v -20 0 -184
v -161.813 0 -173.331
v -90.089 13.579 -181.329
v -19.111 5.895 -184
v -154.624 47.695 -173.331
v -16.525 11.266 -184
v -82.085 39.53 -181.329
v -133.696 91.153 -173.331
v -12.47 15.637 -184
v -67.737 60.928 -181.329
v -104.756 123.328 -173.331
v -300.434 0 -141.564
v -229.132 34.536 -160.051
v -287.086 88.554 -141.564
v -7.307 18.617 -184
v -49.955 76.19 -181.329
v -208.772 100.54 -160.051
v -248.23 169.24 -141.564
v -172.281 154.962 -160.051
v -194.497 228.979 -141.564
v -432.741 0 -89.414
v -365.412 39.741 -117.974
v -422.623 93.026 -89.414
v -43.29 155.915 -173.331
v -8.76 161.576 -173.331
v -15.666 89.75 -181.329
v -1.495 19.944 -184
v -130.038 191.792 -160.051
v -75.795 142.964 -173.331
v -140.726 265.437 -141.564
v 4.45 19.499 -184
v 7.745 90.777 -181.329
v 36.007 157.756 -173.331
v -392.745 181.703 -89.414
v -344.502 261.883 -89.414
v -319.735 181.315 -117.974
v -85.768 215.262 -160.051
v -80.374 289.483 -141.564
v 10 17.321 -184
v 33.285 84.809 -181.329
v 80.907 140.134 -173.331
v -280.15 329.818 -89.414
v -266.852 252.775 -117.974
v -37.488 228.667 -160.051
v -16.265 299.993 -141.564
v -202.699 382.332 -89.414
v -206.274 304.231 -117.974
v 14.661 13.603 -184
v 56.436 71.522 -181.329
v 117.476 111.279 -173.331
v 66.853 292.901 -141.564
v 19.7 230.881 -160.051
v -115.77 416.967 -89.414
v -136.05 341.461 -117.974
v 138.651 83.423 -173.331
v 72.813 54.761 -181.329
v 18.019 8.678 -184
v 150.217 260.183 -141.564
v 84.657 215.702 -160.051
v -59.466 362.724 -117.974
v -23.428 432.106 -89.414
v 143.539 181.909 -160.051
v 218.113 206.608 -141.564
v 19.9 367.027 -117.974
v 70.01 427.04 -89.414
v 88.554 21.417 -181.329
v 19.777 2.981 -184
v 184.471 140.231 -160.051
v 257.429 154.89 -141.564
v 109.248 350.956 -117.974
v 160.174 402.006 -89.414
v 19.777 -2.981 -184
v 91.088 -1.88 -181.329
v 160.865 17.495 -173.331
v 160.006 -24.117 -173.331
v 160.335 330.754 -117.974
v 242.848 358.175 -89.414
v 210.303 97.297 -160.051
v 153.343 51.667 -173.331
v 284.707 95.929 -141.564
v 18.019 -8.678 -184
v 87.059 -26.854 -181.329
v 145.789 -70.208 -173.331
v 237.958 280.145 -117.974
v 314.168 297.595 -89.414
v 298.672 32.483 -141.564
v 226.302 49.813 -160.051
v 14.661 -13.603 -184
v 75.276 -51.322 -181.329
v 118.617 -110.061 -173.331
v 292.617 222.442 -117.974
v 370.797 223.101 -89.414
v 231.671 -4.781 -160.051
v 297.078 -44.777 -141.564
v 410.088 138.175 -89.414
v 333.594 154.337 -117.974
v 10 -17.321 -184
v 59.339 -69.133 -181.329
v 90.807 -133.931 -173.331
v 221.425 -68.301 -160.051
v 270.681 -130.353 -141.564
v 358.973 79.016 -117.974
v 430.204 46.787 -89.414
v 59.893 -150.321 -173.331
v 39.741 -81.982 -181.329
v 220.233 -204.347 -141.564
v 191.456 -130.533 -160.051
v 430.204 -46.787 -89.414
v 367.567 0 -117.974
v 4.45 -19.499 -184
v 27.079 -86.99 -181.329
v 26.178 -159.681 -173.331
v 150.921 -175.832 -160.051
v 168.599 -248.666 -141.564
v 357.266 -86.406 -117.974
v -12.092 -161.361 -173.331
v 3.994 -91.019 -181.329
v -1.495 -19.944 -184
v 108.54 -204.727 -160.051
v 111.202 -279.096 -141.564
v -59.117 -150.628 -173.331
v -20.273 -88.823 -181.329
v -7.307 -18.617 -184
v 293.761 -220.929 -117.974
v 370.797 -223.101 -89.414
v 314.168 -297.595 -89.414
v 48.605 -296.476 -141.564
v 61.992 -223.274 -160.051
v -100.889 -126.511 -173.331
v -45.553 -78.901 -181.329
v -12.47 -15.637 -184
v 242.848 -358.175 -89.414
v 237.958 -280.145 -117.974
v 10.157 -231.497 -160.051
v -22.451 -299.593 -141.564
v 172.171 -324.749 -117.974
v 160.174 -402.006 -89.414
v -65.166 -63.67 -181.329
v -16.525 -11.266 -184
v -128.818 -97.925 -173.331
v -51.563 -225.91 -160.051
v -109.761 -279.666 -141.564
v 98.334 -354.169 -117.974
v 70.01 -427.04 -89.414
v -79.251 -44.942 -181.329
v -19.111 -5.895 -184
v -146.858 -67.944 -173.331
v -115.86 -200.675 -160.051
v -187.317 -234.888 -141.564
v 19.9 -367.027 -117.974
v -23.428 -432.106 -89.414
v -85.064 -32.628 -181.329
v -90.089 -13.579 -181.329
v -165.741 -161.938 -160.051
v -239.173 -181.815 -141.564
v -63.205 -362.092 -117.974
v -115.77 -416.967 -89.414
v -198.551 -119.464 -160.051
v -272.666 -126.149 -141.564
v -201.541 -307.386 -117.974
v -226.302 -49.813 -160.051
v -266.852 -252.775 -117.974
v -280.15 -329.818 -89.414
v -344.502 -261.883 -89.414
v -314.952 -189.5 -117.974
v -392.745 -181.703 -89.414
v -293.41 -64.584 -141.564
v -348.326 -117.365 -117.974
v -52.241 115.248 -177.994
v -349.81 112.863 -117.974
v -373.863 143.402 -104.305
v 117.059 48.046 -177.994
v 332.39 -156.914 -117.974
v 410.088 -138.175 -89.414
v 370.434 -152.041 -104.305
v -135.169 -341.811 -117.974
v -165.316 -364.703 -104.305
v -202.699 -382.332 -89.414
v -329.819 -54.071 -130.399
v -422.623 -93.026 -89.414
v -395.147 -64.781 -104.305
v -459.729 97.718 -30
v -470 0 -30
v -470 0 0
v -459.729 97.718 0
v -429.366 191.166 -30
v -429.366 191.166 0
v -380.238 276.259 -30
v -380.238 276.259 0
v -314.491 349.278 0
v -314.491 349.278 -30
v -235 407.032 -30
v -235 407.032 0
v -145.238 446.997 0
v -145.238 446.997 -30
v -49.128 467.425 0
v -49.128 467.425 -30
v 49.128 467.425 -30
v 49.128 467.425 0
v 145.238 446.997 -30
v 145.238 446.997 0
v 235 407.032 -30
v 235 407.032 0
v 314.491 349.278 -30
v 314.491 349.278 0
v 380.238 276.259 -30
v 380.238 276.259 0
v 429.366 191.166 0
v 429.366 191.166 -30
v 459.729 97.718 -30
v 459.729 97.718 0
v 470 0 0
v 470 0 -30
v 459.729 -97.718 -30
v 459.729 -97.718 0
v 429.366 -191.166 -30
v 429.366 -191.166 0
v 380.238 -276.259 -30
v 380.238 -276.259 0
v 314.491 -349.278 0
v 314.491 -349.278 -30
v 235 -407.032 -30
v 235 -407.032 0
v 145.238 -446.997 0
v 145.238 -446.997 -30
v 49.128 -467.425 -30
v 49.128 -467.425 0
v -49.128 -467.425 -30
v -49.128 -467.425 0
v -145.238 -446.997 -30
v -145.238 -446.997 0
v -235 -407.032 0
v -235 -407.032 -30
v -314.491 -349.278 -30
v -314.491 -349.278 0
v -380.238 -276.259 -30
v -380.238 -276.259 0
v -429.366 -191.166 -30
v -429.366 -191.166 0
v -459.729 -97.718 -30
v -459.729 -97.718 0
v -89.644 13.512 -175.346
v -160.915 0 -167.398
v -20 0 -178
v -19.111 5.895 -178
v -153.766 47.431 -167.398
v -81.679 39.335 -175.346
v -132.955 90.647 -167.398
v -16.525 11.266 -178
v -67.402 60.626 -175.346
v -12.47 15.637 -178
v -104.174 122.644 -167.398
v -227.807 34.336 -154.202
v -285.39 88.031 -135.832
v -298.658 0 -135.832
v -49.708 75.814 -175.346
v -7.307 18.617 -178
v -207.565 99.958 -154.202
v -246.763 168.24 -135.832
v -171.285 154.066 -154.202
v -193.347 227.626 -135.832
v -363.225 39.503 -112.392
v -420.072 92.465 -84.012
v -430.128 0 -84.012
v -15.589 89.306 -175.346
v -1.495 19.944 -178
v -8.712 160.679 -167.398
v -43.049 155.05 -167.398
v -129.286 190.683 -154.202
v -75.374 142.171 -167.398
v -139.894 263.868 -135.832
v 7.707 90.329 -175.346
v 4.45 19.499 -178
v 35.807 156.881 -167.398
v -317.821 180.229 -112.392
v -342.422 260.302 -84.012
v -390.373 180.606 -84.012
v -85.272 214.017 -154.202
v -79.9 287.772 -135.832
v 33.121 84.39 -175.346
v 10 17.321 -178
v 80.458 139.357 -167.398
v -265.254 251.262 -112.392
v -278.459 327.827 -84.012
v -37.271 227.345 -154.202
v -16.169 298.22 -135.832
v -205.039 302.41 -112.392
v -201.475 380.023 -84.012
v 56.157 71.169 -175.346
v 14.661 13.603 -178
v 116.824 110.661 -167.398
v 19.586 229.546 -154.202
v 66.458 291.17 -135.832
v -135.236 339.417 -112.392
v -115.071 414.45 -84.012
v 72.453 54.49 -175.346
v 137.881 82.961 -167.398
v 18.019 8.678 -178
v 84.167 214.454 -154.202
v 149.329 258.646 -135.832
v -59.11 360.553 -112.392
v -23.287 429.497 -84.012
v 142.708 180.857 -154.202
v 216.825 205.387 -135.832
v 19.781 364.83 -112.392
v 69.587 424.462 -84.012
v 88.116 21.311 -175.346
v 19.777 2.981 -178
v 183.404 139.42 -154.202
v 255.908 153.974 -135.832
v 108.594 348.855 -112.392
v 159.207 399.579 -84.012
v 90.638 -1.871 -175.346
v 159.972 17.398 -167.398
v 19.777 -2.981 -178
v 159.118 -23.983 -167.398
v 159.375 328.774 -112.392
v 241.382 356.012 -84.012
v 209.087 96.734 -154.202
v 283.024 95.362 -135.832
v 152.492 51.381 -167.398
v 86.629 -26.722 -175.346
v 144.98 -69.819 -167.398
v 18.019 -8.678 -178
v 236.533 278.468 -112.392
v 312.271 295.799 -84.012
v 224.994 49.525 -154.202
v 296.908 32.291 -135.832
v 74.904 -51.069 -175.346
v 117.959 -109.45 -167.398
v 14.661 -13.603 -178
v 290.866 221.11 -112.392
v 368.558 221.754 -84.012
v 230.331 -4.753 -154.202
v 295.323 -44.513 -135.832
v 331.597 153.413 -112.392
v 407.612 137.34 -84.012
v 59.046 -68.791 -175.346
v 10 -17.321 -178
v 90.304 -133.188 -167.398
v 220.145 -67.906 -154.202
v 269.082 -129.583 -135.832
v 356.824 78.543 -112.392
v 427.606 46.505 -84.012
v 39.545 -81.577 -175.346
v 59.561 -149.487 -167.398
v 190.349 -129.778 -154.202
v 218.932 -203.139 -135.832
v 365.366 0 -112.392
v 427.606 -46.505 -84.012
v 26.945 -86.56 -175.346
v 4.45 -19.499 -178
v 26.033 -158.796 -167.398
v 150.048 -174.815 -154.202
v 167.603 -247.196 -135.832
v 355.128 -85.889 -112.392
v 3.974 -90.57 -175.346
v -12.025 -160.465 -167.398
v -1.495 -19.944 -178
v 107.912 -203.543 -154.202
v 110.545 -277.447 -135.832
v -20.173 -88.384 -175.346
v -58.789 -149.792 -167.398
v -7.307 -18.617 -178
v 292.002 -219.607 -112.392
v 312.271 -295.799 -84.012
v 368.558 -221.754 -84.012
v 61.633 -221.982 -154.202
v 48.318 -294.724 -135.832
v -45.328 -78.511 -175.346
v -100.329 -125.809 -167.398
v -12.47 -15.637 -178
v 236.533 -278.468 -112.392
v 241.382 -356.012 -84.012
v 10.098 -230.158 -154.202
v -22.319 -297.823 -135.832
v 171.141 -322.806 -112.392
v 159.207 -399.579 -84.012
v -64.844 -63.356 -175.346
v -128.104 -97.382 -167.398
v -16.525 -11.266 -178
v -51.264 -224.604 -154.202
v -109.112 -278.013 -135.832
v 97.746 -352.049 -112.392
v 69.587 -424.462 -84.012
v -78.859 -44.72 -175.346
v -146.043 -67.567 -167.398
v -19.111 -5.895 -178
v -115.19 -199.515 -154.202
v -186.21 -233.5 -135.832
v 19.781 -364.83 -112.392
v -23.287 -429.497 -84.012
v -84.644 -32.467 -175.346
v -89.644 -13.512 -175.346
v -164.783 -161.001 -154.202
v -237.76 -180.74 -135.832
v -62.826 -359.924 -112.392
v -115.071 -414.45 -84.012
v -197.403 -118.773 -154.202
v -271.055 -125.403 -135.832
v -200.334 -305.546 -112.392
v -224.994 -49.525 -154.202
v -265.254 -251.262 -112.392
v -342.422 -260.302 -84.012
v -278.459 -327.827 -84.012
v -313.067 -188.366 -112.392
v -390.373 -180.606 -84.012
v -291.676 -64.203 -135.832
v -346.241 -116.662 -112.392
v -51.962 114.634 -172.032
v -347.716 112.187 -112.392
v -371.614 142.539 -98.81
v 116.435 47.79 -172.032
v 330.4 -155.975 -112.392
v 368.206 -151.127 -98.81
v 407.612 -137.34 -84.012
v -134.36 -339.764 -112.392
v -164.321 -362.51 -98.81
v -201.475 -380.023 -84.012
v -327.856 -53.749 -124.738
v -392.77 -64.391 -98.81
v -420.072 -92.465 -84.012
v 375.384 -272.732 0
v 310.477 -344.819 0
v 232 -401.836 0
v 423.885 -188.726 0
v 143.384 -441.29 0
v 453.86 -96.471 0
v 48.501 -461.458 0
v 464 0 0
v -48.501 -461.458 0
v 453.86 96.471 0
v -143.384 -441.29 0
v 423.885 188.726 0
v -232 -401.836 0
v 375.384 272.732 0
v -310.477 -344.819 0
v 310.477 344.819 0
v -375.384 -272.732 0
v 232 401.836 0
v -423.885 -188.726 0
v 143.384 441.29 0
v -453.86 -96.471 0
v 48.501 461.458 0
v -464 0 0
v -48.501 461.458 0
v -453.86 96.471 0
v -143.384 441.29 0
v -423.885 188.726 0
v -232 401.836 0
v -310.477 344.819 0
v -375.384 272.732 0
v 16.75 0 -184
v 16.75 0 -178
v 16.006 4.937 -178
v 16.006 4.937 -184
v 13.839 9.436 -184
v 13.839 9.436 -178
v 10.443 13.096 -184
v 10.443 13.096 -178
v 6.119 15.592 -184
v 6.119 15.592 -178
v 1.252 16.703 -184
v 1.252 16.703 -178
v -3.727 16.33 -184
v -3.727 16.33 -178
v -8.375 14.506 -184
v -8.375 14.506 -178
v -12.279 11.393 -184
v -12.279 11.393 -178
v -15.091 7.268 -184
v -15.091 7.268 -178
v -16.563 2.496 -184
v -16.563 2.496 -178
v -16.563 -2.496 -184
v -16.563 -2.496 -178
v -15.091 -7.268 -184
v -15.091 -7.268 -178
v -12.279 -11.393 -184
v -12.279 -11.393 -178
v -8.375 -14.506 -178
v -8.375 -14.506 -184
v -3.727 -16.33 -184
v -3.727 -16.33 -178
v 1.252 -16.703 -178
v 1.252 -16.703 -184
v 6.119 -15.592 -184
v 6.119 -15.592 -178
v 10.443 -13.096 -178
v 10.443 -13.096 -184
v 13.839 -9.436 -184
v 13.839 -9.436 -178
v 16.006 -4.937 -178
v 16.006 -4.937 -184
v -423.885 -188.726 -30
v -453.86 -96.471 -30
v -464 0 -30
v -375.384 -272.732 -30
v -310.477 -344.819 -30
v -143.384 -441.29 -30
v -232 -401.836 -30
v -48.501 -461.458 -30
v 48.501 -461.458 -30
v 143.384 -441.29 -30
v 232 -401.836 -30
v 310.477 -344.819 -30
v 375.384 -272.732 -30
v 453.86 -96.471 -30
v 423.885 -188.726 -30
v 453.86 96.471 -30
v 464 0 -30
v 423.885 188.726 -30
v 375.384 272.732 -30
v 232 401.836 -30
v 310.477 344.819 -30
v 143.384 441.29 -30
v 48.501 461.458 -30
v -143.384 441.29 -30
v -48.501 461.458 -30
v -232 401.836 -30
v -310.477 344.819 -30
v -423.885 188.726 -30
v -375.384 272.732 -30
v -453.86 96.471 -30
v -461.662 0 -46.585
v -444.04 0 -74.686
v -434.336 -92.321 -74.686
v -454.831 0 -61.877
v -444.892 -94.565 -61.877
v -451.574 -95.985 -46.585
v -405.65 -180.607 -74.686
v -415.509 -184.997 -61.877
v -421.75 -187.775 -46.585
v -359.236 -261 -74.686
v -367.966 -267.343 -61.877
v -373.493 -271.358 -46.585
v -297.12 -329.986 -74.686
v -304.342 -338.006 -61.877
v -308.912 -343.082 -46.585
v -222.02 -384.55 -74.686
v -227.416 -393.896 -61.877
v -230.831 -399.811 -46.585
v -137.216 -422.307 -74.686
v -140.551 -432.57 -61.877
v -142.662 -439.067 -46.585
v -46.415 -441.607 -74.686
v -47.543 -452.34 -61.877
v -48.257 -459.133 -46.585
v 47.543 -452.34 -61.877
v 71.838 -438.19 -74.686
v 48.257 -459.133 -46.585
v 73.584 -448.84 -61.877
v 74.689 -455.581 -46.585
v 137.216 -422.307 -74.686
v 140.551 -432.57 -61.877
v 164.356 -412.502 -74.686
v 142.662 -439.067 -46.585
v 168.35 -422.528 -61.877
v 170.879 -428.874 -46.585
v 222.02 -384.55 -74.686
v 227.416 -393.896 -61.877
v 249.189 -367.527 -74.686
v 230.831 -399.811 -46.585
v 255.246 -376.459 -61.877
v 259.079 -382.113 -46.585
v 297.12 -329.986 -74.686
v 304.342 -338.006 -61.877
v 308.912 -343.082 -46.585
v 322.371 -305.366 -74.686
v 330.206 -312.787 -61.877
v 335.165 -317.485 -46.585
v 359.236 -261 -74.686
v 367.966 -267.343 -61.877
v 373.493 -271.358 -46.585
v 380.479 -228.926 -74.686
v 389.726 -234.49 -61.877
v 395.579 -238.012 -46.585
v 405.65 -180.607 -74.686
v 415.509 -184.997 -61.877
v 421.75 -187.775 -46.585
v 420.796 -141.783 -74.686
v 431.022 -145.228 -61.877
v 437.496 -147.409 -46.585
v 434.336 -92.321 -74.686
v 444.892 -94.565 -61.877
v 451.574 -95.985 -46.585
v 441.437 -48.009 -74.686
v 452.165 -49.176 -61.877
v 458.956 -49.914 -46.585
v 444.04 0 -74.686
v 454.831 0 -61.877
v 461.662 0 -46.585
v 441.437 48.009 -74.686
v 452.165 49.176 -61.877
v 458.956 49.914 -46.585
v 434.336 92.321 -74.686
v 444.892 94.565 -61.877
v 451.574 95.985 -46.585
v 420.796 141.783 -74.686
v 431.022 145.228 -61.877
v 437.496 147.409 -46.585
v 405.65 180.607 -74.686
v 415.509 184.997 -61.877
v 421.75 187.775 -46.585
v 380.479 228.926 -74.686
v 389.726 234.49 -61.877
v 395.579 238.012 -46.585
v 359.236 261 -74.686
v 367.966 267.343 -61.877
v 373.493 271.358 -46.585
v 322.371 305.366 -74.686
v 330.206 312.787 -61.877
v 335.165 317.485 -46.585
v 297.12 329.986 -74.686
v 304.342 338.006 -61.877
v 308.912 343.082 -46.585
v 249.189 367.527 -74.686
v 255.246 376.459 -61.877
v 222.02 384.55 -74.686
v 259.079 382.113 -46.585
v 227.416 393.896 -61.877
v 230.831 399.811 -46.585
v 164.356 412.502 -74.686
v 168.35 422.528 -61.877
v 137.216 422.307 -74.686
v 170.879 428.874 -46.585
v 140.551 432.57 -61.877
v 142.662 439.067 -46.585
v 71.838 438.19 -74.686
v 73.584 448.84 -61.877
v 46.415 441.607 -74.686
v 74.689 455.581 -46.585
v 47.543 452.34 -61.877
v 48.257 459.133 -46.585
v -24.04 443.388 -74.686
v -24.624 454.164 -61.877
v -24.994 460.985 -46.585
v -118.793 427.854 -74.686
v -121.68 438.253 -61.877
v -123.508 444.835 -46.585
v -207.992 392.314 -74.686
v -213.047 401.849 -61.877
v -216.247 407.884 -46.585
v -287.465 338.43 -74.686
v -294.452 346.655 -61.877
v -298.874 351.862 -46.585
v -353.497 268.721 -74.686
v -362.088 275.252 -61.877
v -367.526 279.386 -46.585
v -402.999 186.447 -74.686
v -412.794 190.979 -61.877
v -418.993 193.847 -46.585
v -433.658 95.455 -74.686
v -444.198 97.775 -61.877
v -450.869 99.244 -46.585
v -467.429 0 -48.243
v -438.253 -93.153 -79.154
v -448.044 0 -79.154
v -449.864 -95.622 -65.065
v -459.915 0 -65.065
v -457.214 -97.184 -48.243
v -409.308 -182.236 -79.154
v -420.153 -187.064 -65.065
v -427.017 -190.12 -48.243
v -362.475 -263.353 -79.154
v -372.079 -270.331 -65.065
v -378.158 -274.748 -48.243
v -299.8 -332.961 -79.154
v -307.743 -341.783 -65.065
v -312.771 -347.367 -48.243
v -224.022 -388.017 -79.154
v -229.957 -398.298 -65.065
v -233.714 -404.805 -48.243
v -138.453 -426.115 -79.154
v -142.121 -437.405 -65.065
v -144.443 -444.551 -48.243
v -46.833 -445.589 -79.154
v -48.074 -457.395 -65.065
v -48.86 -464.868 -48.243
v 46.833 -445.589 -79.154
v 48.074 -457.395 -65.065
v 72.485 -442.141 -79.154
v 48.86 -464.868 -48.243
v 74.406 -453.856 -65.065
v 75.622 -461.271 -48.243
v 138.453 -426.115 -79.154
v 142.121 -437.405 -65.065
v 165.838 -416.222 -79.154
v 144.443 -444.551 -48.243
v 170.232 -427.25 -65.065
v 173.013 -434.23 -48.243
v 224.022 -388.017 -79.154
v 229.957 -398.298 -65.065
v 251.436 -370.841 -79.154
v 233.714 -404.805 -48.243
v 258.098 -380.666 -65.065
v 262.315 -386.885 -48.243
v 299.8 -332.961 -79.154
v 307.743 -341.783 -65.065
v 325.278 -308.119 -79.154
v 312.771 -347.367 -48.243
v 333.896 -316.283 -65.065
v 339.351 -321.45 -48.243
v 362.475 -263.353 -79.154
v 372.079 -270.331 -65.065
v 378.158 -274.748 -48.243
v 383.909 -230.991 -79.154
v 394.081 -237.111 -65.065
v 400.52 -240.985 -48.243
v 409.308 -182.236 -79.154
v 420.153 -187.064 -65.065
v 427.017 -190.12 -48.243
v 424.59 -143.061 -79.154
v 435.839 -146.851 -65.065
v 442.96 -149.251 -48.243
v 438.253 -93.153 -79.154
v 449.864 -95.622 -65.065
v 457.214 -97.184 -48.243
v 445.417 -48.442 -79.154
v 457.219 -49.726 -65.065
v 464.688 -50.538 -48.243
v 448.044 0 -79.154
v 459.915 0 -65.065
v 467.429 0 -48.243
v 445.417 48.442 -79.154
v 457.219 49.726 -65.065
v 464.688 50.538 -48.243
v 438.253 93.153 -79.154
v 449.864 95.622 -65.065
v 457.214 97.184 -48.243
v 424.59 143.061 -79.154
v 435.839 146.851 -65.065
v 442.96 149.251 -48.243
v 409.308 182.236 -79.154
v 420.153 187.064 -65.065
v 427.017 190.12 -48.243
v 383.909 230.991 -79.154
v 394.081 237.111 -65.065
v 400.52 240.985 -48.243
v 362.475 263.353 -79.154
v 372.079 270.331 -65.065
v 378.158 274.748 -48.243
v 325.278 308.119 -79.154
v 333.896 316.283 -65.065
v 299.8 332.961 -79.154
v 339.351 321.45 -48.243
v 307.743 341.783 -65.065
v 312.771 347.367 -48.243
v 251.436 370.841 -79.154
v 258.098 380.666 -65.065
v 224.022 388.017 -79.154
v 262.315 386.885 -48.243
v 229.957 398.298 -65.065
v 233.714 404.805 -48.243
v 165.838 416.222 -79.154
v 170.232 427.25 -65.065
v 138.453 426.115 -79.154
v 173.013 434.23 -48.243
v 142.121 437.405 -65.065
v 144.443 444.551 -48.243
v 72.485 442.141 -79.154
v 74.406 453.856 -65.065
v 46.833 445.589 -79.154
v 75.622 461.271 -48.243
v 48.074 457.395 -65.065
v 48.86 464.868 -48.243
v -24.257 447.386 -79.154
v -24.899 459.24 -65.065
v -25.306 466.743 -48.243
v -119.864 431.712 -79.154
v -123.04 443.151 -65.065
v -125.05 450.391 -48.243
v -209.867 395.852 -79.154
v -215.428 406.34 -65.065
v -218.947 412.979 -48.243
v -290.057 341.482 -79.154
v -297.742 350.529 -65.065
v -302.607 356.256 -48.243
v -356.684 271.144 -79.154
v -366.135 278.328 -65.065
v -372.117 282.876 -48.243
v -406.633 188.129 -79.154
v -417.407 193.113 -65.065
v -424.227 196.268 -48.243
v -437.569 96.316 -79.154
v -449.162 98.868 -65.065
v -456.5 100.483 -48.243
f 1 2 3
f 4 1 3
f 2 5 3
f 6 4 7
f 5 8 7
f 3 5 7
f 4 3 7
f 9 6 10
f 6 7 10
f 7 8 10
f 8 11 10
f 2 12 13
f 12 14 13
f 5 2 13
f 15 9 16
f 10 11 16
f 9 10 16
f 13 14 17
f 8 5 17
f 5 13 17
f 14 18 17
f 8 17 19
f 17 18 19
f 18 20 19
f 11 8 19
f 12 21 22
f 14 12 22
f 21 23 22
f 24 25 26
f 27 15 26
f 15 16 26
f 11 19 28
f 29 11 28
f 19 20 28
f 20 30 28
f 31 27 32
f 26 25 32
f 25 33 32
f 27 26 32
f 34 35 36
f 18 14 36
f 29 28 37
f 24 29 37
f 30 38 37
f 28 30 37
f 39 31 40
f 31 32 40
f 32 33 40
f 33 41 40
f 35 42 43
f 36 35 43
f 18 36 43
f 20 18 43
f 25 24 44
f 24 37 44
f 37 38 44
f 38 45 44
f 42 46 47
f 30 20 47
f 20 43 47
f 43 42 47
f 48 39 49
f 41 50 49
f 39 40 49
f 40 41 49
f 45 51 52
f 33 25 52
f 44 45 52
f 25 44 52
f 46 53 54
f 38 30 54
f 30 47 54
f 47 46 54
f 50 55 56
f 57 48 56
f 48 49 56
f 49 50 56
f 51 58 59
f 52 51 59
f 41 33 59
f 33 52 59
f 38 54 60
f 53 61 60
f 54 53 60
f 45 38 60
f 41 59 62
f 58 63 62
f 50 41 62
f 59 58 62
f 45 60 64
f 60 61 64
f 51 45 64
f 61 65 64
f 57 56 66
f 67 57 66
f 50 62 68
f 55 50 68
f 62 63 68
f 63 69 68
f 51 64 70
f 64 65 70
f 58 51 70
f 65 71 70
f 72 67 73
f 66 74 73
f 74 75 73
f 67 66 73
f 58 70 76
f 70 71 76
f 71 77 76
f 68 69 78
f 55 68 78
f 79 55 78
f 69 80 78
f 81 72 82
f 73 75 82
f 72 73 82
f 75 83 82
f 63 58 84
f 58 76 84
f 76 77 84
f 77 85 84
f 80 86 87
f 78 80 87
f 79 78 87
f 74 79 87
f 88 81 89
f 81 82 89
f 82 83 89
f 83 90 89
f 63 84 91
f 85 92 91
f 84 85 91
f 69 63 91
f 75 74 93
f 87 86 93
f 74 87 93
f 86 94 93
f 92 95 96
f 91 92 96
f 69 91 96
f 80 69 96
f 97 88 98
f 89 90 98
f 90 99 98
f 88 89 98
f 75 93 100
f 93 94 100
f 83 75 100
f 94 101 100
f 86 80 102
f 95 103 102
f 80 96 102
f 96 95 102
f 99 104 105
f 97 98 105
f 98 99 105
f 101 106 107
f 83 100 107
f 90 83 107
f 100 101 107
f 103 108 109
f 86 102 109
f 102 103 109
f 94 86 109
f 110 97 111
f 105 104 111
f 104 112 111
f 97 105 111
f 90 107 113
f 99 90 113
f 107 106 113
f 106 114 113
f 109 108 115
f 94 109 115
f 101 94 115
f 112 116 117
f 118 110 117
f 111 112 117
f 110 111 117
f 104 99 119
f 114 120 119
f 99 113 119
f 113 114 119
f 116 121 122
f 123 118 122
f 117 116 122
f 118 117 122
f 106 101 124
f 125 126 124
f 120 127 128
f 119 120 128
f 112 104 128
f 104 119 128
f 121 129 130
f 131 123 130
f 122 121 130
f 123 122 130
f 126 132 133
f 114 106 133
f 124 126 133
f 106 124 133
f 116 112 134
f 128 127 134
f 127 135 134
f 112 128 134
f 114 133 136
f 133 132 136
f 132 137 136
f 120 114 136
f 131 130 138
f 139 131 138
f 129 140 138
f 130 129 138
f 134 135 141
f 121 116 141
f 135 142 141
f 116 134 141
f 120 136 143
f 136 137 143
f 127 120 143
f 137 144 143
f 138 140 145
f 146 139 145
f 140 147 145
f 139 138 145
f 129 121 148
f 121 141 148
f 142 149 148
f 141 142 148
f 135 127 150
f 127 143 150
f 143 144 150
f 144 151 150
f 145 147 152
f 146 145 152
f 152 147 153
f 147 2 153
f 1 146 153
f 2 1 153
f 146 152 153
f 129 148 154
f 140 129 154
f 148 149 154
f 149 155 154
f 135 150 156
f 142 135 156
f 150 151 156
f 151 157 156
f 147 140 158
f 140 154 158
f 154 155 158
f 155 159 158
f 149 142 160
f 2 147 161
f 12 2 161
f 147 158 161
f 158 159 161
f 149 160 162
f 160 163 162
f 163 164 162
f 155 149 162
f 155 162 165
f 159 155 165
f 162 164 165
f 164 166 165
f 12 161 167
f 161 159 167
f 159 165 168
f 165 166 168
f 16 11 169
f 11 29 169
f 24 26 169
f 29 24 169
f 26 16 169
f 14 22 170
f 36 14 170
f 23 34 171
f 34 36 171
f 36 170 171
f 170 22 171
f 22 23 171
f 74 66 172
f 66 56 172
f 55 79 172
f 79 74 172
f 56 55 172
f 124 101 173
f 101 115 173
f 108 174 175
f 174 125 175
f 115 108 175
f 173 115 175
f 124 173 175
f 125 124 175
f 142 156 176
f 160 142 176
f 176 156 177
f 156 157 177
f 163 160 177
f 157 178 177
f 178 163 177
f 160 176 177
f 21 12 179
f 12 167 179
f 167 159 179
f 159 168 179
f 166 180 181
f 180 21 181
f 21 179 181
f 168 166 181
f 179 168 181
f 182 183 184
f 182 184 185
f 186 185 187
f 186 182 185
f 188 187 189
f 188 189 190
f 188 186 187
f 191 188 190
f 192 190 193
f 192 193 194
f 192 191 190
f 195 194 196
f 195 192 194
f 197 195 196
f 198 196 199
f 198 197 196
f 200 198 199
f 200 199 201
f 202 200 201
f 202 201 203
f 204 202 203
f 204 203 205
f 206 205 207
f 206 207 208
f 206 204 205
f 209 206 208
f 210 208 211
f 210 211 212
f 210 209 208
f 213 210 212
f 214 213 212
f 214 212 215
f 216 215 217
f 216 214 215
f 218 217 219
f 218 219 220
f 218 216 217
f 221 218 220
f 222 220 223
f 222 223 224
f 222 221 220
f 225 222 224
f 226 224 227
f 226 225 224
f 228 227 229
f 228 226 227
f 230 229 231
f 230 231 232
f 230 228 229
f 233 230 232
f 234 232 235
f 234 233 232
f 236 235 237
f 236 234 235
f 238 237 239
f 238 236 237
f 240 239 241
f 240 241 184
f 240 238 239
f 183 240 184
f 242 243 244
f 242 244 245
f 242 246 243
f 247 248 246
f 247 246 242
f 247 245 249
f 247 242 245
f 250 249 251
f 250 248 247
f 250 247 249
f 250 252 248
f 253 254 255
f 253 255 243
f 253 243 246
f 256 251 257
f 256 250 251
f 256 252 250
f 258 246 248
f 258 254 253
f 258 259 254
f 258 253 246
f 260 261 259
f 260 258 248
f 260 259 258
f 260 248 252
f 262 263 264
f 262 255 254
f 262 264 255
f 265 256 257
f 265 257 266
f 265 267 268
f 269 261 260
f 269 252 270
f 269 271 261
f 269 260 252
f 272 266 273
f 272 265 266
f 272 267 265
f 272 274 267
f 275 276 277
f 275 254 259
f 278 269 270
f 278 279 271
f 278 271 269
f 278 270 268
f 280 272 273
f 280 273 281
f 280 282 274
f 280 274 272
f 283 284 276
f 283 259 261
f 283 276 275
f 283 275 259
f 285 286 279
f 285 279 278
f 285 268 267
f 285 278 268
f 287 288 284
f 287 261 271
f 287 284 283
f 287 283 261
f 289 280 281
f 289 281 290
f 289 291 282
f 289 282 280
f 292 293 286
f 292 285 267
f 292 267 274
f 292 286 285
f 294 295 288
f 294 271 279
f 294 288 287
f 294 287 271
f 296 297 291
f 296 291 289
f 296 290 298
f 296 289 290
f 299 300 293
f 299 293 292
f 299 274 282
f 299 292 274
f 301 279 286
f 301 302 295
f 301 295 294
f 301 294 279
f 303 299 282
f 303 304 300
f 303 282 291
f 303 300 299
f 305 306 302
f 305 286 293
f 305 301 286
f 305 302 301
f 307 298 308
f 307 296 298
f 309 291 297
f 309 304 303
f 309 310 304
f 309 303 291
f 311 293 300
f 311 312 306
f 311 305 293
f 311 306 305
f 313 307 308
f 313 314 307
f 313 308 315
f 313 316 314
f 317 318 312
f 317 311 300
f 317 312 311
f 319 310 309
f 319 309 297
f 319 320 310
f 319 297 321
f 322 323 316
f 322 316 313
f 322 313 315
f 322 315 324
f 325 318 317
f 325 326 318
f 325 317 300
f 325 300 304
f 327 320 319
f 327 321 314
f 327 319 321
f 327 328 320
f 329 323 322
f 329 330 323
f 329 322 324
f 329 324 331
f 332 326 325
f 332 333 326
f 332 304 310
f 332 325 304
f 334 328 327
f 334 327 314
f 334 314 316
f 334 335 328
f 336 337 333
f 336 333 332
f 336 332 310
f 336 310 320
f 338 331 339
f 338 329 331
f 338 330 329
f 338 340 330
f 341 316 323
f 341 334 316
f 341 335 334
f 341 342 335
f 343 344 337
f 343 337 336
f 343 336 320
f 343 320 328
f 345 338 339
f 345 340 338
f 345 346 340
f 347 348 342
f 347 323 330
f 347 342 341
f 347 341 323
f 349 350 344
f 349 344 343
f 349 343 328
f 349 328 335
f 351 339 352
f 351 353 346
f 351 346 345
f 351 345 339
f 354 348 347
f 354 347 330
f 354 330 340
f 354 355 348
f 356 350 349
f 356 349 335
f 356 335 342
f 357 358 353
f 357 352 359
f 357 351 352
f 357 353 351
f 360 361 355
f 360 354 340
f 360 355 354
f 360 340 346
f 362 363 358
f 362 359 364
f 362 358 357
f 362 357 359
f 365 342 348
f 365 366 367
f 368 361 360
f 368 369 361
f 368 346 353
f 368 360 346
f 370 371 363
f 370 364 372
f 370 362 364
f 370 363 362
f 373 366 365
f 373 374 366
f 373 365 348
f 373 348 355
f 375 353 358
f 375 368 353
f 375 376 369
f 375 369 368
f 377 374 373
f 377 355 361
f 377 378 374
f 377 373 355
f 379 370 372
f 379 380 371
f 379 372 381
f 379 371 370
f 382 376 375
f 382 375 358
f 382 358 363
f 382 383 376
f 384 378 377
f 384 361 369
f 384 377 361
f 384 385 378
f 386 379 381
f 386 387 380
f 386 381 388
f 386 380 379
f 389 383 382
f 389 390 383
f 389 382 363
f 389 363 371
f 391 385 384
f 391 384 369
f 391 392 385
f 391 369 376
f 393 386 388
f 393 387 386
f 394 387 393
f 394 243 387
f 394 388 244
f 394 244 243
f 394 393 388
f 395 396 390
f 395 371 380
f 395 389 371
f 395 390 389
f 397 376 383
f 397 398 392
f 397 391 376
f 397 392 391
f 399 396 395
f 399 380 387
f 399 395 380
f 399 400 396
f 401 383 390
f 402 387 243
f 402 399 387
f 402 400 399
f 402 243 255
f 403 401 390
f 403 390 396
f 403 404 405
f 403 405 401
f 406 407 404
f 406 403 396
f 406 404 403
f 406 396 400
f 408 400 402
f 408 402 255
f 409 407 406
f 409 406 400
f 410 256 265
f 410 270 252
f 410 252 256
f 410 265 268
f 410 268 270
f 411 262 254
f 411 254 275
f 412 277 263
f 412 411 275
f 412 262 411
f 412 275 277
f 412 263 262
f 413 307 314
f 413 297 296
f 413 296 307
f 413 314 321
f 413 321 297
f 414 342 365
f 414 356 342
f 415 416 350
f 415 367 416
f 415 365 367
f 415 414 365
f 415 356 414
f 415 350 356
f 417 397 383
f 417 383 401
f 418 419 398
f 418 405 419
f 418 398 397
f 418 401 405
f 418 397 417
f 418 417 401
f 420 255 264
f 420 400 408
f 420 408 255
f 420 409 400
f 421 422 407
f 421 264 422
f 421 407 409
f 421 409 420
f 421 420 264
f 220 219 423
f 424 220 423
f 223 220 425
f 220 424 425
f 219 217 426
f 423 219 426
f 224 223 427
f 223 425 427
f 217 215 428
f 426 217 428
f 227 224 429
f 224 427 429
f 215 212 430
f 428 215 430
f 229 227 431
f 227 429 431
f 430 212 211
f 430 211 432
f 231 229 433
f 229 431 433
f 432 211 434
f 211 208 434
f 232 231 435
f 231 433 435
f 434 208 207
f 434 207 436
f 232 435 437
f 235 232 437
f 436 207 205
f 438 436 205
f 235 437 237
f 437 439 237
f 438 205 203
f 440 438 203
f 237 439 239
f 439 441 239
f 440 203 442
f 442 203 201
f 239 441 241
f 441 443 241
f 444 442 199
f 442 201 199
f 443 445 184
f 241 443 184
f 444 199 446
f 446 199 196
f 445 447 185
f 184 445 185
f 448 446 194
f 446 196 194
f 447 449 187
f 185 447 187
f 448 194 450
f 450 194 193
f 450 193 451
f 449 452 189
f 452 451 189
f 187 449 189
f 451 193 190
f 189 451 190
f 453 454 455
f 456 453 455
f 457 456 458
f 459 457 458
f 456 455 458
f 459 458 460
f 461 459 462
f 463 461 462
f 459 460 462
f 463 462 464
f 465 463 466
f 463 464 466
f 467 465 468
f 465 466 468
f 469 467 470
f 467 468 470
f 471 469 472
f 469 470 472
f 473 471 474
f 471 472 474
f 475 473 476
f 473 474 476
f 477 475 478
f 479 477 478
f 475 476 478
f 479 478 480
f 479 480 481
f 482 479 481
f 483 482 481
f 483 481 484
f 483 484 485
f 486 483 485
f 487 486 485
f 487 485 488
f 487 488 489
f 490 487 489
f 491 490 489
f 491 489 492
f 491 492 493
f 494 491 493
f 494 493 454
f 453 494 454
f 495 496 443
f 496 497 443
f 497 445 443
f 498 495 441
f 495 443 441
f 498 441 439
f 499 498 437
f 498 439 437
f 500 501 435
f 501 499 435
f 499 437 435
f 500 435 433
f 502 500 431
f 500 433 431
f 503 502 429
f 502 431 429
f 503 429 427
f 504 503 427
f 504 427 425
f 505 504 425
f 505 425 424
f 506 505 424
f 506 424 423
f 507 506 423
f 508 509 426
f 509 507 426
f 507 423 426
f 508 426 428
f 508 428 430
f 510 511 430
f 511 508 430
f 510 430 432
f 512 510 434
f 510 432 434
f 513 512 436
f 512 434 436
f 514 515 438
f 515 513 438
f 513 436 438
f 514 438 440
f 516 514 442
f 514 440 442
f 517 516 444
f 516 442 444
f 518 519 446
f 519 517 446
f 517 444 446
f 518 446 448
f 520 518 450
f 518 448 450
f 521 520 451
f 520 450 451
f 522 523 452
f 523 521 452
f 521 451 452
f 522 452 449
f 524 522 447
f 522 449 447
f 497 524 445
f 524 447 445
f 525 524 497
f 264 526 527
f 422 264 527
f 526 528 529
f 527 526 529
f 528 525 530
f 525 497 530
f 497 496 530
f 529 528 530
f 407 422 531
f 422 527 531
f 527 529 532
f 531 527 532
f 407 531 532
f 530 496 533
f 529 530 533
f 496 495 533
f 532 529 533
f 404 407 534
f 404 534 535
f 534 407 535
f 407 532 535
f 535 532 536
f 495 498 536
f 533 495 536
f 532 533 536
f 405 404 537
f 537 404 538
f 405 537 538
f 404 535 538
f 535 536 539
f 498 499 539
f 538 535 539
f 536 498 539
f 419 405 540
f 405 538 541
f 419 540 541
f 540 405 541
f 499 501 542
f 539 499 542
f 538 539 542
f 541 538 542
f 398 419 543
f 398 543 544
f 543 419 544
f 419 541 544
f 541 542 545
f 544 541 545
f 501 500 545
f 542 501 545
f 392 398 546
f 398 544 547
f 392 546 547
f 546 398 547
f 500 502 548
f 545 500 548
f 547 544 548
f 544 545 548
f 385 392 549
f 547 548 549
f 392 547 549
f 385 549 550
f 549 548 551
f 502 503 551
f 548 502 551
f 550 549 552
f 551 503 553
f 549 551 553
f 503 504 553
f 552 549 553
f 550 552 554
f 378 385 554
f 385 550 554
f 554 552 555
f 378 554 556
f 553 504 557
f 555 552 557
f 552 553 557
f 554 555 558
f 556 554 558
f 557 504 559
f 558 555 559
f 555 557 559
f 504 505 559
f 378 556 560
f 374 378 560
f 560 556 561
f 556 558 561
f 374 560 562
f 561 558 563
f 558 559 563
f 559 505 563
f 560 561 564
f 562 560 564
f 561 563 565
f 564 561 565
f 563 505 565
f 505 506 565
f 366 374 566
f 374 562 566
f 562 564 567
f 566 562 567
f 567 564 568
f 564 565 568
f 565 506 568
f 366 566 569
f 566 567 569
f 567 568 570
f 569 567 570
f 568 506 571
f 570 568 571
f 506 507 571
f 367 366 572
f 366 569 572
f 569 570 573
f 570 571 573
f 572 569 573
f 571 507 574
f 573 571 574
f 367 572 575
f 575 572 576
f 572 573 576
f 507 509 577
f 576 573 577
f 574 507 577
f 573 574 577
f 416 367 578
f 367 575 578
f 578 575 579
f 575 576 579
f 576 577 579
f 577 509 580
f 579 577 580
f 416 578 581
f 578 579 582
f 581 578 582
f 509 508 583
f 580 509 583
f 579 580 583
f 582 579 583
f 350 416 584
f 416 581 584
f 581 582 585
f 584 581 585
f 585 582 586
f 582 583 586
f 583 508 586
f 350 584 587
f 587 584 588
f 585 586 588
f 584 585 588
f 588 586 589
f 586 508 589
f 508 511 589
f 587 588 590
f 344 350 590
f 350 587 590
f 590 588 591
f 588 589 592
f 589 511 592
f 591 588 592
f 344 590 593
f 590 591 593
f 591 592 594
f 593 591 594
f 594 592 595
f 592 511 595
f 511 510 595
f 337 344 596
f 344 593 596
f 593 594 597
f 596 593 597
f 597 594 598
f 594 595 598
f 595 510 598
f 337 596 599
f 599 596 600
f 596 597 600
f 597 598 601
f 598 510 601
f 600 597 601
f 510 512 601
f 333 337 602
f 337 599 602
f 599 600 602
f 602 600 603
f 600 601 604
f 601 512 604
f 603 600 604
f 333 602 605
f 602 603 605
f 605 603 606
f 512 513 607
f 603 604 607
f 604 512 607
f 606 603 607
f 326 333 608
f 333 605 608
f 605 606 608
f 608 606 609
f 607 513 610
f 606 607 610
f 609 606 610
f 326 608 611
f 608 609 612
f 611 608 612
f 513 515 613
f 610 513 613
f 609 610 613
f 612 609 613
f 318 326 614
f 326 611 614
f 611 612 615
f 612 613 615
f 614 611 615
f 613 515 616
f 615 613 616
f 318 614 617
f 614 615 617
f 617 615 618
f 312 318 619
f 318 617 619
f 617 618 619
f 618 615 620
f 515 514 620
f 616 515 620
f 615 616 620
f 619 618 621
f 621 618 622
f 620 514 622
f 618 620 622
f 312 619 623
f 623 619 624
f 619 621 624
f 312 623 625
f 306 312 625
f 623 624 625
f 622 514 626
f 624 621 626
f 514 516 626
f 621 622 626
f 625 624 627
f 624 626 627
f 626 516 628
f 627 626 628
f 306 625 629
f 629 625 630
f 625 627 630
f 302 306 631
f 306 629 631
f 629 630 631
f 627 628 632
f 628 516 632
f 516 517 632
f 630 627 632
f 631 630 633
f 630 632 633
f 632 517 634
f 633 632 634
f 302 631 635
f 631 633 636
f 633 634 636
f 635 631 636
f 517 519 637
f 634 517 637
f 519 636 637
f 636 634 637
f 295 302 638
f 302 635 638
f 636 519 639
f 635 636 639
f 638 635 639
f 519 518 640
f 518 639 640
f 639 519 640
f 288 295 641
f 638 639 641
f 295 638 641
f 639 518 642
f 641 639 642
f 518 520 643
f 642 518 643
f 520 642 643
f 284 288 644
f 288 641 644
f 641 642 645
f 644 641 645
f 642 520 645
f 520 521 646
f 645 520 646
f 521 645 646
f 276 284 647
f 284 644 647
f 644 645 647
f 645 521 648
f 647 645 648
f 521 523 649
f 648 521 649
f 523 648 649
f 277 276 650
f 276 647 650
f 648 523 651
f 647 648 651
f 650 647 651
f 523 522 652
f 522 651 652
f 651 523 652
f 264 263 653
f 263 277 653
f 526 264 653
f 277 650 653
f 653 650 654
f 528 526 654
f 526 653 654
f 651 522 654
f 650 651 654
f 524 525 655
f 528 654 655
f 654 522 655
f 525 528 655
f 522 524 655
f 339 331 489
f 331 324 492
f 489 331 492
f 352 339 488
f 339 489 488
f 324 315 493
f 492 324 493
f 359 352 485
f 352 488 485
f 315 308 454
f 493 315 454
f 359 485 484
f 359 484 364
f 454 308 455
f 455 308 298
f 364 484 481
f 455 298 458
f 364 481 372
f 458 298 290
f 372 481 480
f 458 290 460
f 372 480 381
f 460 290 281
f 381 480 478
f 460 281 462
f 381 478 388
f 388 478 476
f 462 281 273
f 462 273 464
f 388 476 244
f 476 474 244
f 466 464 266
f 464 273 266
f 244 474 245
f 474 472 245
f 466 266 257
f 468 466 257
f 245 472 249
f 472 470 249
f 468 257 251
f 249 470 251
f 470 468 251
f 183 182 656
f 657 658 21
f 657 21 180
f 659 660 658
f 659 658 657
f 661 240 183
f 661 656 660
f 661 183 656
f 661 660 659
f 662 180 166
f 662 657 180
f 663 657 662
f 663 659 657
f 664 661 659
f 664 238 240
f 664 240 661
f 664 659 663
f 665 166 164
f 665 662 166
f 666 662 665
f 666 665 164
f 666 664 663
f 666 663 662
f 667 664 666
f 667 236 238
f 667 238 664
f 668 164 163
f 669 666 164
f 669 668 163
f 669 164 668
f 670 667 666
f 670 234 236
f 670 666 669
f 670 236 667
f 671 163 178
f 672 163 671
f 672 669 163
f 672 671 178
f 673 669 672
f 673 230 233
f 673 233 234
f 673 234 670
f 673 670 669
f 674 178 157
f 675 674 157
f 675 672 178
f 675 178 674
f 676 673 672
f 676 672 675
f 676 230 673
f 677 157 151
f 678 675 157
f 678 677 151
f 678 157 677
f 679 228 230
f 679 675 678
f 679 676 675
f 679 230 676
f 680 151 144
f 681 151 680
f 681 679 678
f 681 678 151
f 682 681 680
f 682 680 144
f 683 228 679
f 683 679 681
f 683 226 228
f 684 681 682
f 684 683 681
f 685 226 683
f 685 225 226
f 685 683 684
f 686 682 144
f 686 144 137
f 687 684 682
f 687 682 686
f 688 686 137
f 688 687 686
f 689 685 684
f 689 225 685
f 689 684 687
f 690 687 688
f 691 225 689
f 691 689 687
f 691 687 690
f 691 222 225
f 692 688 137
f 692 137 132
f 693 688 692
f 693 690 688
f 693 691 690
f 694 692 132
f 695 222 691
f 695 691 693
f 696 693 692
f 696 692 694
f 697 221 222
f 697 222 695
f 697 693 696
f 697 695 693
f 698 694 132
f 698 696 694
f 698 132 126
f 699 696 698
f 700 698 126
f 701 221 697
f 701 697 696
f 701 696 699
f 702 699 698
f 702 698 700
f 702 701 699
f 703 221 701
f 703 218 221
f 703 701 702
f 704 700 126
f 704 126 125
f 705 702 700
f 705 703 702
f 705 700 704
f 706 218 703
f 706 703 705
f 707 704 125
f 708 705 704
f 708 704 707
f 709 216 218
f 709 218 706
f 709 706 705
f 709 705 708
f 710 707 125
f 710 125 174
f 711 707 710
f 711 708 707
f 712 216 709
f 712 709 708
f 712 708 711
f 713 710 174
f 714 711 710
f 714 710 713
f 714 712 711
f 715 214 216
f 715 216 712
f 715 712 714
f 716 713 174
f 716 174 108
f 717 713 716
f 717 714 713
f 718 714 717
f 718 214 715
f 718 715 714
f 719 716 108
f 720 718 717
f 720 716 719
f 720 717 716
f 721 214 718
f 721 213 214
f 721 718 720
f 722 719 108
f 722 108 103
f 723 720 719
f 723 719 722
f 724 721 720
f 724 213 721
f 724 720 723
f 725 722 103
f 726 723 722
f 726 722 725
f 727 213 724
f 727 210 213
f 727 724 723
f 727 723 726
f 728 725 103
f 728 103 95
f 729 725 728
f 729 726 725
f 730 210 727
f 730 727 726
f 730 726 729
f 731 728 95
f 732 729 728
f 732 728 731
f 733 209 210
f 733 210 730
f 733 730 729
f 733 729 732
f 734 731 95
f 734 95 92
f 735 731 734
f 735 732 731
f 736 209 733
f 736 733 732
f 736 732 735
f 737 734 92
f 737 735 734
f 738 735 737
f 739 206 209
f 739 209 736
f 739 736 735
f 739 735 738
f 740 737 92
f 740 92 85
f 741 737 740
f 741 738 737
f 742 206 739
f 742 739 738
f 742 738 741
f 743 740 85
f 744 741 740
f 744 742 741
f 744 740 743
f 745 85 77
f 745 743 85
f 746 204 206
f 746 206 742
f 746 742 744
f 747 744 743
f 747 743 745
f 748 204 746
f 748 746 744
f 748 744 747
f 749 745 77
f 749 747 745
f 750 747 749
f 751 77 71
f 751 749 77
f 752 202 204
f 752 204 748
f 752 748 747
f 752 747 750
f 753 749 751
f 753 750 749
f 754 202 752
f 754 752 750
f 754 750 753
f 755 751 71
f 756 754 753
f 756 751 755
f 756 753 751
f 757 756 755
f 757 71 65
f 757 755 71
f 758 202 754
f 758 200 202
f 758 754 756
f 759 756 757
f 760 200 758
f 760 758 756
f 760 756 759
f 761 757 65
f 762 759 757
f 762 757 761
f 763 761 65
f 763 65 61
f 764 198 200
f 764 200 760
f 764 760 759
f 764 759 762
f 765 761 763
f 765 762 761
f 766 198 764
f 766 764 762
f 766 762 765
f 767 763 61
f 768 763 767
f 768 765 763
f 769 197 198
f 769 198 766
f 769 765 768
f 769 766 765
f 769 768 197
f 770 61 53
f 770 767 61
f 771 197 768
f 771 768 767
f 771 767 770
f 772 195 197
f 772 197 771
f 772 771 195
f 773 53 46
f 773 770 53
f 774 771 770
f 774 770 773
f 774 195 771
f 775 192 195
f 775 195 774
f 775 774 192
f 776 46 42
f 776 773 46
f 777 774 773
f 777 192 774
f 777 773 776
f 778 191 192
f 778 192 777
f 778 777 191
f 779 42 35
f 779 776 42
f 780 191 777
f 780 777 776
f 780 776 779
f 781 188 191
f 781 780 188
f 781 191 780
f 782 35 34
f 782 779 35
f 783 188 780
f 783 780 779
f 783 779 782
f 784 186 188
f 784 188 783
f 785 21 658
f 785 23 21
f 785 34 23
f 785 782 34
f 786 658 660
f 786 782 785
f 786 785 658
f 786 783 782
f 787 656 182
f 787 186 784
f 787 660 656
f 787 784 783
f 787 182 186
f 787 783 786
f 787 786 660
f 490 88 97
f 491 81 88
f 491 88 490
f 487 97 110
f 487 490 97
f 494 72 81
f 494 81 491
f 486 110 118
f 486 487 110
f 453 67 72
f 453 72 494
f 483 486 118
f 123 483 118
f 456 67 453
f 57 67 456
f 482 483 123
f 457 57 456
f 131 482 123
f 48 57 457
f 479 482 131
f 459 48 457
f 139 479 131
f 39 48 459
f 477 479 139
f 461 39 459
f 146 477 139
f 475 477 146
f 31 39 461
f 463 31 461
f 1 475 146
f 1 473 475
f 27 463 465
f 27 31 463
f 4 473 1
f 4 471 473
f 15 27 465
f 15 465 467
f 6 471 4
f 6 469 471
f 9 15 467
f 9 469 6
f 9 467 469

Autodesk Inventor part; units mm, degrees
ref_plane "YZ Plane" through (0, 0, 0) normal (1, 0, 0) x (0, 1, 0)
ref_plane "XZ Plane" through (0, 0, 0) normal (0, 1, 0) x (-1, 0, 0)
ref_plane "XY Plane" through (0, 0, 0) normal (0, 0, 1) x (1, 0, 0)
sketch "Sketch1" plane through (0, 0, 0) normal (0, 1, 0) x (-1, 0, 0)
  line L0 (470, 0) -> (470, -30)
  arc A0 (432.7406, -89.4136) -> (470, -30) centre (404, -30) ccw
  arc A1 (20, -184) -> (432.7406, -89.4136) centre (20, 763.8182) ccw
  line L1 (0, 0) -> (0, -191.6842)
  arc A2 (20, -178) -> (430.1278, -84.0124) centre (20, 763.8182) ccw
  arc A3 (430.1278, -84.0124) -> (464, -30) centre (404, -30) ccw
  line L2 (464, -30) -> (464, 0)
  line L3 (464, 0) -> (470, 0)
  line L4 (0, -178) -> (0, -184)
  line L5 (0, -184) -> (20, -184)
  line L6 (0, -178) -> (20, -178)
  point P0 (0, 0)
  point P1 (0, -163.7009)
  point P2 (0, -169.7009)
  dimension "d1" = 30
  dimension "d3" = 947.8182
  dimension "d12" = 184
  dimension "d13" = 6
  dimension "d14" = 40
  dimension "d15" = 60
  dimension "d16" = 940
revolve "Revolution1" add sketch "Sketch1" angle 360 about axis through (0, 0, 0) along (0, 0, -1)
sketch "Sketch2" plane through (0, 0, 0) normal (0, 0, 1) x (1, 0, 0)
  circle A0 centre (0, 0) radius 16.75
  dimension "d8" = 33.5
extrude "Extrusion1" cut sketch "Sketch2" against normal through all
equation "\"d12\" = AA_MAIN_dish_hight"
equation "\"d16\" = AA_MAIN_filter_diam"
equation "\"AA_MAIN_filter_diam\" = 940"
equation "\"AA_MAIN_dish_hight\" = 184"
properties part number "PRS 1604 dished head_D1200 940"
